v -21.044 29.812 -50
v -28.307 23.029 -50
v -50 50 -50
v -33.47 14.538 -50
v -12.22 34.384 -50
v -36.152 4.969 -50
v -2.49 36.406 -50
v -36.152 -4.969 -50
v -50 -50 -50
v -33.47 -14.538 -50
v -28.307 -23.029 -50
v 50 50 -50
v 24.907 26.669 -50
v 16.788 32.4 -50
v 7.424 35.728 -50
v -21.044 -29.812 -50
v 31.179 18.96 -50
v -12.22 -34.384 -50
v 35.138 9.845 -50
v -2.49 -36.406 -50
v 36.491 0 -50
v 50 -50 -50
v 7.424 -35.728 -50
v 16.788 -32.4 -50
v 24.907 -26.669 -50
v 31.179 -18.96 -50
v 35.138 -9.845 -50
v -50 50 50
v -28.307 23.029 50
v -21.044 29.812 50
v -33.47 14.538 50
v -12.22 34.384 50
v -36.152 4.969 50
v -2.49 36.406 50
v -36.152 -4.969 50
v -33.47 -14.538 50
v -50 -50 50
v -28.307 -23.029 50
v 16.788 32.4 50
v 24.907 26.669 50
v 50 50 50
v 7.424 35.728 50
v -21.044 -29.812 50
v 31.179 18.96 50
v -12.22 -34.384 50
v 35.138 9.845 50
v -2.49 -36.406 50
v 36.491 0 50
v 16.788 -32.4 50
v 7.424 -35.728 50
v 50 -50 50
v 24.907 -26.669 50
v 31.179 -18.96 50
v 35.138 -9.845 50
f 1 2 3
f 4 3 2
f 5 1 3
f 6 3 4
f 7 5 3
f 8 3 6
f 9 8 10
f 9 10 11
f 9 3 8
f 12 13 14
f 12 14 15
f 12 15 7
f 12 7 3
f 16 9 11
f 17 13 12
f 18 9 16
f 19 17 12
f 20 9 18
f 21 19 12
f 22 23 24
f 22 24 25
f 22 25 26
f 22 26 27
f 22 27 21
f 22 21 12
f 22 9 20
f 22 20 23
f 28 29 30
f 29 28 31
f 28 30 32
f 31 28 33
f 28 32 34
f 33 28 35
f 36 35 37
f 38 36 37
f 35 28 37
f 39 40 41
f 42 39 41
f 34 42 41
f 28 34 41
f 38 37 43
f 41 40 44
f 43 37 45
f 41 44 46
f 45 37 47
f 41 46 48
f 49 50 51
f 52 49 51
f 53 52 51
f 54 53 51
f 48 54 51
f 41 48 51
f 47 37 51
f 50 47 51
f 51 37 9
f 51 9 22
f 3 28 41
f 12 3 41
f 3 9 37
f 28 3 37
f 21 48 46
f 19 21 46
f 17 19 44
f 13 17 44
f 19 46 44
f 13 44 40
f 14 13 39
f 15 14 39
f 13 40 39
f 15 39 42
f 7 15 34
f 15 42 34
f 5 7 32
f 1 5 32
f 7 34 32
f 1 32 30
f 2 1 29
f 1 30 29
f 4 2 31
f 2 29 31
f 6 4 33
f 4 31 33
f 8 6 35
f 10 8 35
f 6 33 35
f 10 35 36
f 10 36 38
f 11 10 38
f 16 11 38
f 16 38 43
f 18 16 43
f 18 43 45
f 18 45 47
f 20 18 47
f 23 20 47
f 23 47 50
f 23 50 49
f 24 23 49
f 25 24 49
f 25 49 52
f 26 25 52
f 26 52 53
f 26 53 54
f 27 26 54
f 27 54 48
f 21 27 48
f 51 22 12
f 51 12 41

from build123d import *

# Parameters (mm, degrees)
F0_W     = 100
F0_H     = 100
F1_DEPTH = 50
F2_R     = 36.4914708522
F3_DEPTH = 100.001


with BuildPart() as f1:
    # F0 (on Front) → F1 (new body, symmetric)
    with BuildSketch(Plane.XZ):
        Rectangle(F0_W, F0_H)
    extrude(amount=F1_DEPTH, both=True)

    # F2 (on face) → F3 (cut, through all)
    with BuildSketch(Plane.XY.offset(50)):
        Circle(F2_R)
    extrude(amount=-F3_DEPTH, mode=Mode.SUBTRACT)


solid = f1.part
